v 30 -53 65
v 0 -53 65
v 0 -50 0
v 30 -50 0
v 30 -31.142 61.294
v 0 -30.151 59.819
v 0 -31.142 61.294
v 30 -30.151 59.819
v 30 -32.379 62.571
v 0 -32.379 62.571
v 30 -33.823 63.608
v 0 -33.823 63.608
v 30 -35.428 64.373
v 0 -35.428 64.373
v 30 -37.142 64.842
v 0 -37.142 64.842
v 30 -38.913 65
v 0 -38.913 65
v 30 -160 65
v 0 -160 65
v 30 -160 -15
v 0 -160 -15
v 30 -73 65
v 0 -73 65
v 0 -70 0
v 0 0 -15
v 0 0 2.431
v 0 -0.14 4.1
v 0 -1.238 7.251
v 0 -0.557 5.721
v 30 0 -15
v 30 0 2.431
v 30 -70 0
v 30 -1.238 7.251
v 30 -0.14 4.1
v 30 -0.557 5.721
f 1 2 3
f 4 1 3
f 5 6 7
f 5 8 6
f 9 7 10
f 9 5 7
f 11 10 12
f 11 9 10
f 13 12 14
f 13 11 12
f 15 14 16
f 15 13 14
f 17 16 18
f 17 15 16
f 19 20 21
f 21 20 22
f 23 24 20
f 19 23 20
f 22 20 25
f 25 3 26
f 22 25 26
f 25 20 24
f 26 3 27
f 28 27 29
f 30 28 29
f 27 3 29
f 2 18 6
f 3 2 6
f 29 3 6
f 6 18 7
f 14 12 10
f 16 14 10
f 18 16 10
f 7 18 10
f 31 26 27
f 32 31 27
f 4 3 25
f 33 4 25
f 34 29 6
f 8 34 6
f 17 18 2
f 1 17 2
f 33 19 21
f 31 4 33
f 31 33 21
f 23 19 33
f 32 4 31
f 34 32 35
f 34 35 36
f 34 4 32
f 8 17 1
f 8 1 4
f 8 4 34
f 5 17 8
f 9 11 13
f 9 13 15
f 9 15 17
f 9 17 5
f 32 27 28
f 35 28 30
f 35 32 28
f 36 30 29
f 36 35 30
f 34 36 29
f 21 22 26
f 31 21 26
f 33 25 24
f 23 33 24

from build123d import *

# Parameters (mm, degrees)
F1_DEPTH = 30
F2_R     = 10


with BuildPart() as f1:
    # F0 (on Right) → F1 (new body)
    with BuildSketch(Plane.YZ):
        Polygon((-160, 65), (-160, 0), (-160, -15), (0, -15), (0, 5), (-33, 65), (-53, 65), (-50, 0), (-70, 0), (-73, 65), align=None)
    extrude(amount=F1_DEPTH)

    # F2
    f2_edges = [f1.edges().sort_by_distance(p)[0] for p in [
        (15, -33, 65),
        (15, 0, 5),
    ]]
    fillet(f2_edges, radius=F2_R)


solid = f1.part
